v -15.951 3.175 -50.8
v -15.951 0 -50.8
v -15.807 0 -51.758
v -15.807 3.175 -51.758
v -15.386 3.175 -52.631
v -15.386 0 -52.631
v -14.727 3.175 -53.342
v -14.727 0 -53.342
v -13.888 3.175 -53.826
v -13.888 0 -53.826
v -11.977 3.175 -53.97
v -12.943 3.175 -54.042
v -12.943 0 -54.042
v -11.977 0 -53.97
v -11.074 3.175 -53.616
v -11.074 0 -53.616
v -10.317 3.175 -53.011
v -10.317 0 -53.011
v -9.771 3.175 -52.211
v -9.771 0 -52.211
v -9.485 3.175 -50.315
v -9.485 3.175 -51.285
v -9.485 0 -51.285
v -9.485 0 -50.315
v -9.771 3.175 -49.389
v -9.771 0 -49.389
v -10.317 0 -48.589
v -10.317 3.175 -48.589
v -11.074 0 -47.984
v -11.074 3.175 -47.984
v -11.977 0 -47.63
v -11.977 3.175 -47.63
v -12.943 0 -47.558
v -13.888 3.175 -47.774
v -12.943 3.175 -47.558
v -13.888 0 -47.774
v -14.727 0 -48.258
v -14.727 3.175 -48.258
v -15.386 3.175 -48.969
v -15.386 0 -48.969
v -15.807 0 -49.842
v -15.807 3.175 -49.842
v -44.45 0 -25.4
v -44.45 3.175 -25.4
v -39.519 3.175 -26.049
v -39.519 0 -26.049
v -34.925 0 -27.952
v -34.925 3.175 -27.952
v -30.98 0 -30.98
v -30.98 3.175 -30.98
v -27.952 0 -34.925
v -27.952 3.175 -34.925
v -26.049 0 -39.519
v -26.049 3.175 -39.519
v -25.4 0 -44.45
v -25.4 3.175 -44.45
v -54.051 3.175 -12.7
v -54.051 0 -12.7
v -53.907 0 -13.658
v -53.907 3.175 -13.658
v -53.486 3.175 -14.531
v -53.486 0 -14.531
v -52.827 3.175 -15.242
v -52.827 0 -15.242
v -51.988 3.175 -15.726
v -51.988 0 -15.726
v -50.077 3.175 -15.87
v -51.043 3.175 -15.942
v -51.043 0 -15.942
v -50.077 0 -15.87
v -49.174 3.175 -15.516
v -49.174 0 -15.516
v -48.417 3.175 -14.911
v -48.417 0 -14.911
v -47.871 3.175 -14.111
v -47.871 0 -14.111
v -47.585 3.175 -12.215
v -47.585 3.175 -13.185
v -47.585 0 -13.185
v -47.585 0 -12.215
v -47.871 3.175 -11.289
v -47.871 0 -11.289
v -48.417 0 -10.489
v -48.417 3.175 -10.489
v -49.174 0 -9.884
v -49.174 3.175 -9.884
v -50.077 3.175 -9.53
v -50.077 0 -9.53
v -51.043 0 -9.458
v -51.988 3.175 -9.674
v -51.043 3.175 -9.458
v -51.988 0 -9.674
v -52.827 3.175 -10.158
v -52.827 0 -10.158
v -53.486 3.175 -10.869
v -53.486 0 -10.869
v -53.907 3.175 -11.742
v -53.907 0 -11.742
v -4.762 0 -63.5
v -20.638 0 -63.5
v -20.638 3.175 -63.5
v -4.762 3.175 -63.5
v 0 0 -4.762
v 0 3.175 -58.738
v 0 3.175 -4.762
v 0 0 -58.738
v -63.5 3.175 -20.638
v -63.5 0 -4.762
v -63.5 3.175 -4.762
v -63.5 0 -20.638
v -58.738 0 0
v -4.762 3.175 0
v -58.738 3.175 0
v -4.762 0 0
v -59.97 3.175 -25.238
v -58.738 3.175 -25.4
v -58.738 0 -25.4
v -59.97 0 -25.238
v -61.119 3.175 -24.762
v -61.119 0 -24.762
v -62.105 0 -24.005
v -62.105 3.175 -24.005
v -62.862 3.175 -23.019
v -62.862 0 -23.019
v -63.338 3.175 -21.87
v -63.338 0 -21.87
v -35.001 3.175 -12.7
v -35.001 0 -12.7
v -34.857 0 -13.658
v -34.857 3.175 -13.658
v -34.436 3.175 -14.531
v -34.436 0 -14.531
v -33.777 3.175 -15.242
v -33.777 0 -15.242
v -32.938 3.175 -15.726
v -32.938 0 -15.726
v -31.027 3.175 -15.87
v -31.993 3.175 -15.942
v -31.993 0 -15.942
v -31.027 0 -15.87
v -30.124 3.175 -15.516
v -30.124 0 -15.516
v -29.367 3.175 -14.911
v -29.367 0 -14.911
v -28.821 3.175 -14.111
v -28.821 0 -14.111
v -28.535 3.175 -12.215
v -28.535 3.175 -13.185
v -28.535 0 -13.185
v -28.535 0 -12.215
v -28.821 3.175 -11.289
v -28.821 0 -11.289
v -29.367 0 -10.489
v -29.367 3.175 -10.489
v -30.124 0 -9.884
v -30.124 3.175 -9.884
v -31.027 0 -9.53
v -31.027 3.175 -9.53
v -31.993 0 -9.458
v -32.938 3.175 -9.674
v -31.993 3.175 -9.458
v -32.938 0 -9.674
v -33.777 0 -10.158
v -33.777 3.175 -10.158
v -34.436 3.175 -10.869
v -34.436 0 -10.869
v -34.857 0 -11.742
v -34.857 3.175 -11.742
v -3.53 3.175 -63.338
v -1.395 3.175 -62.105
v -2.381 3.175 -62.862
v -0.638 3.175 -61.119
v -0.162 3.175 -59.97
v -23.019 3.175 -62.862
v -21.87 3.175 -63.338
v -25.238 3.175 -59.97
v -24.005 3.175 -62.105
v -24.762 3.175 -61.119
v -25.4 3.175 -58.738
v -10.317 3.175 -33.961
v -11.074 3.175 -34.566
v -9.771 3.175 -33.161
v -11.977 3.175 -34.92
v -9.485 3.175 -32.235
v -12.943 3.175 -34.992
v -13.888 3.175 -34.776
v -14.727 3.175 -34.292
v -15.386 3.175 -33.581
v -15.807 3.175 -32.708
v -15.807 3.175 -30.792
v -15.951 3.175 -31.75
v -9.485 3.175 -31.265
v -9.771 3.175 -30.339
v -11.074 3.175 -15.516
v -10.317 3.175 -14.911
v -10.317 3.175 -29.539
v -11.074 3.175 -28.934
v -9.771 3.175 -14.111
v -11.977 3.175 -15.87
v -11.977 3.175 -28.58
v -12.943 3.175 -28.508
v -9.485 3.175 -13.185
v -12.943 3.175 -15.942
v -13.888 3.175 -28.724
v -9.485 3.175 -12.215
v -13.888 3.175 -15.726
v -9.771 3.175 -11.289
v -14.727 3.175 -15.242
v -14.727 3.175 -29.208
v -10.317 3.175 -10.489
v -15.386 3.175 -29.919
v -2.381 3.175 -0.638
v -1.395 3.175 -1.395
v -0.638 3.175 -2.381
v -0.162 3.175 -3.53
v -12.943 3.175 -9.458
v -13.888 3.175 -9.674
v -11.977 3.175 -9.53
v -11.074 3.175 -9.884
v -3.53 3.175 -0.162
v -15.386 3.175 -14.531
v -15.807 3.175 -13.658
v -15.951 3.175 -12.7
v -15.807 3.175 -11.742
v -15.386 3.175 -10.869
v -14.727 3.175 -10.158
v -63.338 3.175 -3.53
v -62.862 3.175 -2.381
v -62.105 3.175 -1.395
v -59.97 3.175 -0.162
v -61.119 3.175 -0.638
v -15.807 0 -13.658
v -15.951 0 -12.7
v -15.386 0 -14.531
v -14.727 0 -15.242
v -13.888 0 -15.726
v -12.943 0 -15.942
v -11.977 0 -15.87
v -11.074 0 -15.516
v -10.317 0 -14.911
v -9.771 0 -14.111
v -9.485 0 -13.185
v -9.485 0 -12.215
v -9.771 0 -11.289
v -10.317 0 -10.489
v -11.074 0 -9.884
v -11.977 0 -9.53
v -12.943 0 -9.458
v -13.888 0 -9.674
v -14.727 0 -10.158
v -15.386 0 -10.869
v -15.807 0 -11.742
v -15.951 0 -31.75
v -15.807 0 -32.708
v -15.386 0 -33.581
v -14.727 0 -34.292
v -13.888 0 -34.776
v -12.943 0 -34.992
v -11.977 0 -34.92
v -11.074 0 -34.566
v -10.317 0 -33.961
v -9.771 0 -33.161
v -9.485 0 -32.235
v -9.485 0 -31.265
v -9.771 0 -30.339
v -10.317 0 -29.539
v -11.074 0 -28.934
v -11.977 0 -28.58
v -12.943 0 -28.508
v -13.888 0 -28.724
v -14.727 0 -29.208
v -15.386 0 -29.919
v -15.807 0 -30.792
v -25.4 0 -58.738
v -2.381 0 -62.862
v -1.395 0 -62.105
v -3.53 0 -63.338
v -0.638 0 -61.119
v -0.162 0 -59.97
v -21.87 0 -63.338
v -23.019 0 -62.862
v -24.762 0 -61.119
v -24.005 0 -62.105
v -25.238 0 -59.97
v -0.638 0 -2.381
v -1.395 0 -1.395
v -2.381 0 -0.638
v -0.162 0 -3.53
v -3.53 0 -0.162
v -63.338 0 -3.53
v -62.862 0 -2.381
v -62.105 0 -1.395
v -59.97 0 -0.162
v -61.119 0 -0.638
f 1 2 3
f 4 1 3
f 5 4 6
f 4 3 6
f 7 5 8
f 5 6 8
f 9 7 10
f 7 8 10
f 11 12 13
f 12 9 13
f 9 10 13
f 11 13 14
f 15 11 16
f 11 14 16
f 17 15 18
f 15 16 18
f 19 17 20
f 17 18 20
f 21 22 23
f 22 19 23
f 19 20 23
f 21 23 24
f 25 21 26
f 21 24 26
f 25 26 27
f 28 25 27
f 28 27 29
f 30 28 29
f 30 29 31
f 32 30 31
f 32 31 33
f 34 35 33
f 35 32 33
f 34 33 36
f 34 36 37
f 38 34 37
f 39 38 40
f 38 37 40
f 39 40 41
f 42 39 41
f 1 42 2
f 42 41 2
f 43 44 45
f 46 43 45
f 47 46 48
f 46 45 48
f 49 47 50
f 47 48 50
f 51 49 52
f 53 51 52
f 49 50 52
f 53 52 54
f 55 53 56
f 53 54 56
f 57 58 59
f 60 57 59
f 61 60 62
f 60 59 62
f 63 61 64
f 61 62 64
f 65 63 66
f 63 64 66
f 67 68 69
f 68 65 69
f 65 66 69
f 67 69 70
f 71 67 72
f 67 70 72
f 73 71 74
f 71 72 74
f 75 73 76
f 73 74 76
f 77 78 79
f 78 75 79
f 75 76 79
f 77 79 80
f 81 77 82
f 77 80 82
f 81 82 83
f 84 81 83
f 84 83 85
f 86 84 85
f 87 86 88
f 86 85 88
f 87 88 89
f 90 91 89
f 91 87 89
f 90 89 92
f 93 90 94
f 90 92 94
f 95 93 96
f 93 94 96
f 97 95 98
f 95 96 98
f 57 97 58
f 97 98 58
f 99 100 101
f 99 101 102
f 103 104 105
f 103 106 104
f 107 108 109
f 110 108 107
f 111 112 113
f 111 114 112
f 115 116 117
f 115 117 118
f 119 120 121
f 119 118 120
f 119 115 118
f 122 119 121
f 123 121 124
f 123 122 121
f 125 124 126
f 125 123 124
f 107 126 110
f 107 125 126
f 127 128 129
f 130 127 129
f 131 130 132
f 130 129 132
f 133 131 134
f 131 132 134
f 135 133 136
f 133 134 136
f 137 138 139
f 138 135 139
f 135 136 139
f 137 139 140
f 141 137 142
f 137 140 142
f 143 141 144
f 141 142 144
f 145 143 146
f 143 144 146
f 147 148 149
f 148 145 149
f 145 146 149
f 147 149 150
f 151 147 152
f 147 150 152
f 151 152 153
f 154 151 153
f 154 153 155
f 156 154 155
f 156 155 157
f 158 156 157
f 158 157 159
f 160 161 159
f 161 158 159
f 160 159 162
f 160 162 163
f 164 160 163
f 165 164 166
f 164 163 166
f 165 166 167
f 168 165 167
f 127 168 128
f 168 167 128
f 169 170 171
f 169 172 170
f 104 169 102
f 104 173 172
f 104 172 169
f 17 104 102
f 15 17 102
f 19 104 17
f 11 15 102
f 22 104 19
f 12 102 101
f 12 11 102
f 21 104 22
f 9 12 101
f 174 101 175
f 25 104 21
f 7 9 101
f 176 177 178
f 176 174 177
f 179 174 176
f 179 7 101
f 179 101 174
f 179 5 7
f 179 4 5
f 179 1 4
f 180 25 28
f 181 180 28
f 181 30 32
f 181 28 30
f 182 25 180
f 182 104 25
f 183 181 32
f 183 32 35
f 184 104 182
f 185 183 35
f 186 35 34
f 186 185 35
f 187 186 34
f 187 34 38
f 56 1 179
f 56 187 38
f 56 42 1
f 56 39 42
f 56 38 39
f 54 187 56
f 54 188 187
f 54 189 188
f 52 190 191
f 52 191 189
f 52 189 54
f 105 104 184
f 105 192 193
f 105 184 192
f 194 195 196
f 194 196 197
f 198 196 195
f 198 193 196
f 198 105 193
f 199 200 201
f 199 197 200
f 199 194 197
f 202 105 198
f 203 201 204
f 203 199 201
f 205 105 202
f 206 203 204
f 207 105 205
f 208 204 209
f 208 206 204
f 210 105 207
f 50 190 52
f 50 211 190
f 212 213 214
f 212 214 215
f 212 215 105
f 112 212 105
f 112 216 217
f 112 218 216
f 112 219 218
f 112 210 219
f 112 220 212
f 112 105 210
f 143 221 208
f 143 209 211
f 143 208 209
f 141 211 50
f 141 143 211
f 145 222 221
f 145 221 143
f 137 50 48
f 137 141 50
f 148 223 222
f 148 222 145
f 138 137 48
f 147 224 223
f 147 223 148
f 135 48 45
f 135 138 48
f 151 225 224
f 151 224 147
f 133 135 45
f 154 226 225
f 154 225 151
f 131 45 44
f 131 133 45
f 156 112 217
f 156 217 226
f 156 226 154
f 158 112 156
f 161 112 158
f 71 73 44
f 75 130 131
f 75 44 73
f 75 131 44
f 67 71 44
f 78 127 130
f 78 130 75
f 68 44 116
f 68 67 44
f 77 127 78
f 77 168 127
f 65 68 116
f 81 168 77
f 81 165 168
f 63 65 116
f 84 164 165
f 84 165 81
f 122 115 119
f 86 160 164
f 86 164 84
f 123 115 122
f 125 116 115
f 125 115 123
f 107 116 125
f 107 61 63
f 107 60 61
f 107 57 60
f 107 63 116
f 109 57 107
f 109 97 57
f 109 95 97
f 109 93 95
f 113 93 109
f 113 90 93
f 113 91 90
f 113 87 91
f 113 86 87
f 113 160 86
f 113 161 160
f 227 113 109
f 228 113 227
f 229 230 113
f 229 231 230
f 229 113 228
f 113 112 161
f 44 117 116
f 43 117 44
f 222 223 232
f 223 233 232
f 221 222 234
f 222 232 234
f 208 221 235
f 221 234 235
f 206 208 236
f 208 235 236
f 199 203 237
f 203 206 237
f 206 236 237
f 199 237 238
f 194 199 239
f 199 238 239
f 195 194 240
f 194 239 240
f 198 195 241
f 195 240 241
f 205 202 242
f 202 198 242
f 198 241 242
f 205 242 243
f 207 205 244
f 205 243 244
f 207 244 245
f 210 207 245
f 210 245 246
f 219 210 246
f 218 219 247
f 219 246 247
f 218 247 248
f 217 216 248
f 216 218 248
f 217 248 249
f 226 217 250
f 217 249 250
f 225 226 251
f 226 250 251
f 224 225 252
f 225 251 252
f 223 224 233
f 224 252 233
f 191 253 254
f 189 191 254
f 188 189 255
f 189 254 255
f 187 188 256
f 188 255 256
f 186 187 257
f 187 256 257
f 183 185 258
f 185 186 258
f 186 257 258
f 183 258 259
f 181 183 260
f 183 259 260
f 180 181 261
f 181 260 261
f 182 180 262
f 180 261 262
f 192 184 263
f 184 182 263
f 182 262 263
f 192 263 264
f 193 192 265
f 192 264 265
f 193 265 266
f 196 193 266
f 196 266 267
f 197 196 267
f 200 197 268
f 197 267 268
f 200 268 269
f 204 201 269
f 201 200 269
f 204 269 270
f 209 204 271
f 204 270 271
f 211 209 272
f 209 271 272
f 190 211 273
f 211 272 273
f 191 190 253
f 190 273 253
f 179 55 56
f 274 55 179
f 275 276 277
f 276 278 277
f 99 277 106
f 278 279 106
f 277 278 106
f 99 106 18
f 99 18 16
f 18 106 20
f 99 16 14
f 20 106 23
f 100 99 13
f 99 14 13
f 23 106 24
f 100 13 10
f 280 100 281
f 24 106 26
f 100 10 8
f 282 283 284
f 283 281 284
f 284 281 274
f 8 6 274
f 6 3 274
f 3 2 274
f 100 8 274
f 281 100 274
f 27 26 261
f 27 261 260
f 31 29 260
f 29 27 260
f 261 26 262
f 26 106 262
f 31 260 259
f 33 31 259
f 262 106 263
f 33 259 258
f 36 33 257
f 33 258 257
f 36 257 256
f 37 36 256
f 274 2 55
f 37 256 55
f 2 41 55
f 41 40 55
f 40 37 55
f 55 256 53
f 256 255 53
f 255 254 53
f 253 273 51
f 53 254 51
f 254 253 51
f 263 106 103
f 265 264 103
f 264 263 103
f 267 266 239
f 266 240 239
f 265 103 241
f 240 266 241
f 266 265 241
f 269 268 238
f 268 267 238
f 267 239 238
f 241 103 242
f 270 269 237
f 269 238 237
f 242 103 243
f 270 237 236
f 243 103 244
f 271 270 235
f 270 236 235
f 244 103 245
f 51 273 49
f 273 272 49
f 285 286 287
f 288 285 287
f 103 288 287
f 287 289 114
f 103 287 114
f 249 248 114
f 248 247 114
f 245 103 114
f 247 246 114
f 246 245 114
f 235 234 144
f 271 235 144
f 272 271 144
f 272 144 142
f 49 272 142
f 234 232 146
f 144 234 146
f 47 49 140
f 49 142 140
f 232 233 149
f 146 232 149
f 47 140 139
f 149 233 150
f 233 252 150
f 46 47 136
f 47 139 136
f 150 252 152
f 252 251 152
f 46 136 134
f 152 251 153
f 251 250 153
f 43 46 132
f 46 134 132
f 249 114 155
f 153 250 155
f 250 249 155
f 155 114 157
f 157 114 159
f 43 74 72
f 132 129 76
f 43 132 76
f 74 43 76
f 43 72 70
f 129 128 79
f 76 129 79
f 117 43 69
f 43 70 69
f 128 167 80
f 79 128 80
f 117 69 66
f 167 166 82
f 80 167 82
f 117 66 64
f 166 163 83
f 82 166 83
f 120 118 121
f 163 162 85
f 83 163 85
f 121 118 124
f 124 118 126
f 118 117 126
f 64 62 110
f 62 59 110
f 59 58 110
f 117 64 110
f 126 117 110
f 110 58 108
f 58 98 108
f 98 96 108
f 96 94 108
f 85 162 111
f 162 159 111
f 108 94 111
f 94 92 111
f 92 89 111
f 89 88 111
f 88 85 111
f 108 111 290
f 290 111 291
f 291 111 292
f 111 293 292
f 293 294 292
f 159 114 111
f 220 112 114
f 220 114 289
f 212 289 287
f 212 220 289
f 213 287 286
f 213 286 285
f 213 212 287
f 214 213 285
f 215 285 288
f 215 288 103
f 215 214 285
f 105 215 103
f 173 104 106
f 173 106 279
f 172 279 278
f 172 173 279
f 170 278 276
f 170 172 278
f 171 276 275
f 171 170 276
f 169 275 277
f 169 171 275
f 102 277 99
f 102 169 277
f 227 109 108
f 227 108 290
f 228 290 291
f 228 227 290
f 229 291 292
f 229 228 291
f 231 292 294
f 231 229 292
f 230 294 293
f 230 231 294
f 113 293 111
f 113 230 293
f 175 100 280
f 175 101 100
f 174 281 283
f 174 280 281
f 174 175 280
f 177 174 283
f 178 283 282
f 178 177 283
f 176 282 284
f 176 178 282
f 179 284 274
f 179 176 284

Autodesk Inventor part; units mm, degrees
ref_plane "YZ Plane" through (0, 0, 0) normal (1, 0, 0) x (0, 1, 0)
ref_plane "XZ Plane" through (0, 0, 0) normal (0, 1, 0) x (-1, 0, 0)
ref_plane "XY Plane" through (0, 0, 0) normal (0, 0, 1) x (1, 0, 0)
sketch "Sketch1" plane through (0, 0, 0) normal (0, 1, 0) x (-1, 0, 0)
  line L0 (0, 0) -> (63.5, 0)
  line L1 (63.5, 0) -> (63.5, -25.4)
  line L2 (63.5, -25.4) -> (25.4, -25.4)
  line L3 (25.4, -25.4) -> (25.4, -63.5)
  line L4 (25.4, -63.5) -> (0, -63.5)
  line L5 (0, -63.5) -> (0, 0)
  circle A0 centre (12.7, -12.7) radius 3.2512
  line L6 (0, 0) -> (25.4, -25.4) construction
  circle A1 centre (31.75, -12.7) radius 3.2512
  circle A2 centre (50.8, -12.7) radius 3.2512
  circle A3 centre (12.7, -31.75) radius 3.2512
  circle A4 centre (12.7, -50.8) radius 3.2512
  point P0 (12.7, -12.7)
  dimension "d0" = 25.4
  dimension "d1" = 6.5024
  dimension "d2" = 19.05
  dimension "d3" = 19.05
  dimension "d4" = 12.7
extrude "Extrusion1" add sketch "Sketch1" along normal blind 3.175
fillet "Fillet1" radius 4.7625 5 edges at (0, 1.5875, 0) (-63.5, 1.5875, 0) (-63.5, 1.5875, -25.4) (0, 1.5875, -63.5) (-25.4, 1.5875, -63.5)
fillet "Fillet2" radius 19.05 1 edges at (-25.4, 1.5875, -25.4)
properties part number "STRU_009_FrameBracket_90" material "Aluminum 6061"
